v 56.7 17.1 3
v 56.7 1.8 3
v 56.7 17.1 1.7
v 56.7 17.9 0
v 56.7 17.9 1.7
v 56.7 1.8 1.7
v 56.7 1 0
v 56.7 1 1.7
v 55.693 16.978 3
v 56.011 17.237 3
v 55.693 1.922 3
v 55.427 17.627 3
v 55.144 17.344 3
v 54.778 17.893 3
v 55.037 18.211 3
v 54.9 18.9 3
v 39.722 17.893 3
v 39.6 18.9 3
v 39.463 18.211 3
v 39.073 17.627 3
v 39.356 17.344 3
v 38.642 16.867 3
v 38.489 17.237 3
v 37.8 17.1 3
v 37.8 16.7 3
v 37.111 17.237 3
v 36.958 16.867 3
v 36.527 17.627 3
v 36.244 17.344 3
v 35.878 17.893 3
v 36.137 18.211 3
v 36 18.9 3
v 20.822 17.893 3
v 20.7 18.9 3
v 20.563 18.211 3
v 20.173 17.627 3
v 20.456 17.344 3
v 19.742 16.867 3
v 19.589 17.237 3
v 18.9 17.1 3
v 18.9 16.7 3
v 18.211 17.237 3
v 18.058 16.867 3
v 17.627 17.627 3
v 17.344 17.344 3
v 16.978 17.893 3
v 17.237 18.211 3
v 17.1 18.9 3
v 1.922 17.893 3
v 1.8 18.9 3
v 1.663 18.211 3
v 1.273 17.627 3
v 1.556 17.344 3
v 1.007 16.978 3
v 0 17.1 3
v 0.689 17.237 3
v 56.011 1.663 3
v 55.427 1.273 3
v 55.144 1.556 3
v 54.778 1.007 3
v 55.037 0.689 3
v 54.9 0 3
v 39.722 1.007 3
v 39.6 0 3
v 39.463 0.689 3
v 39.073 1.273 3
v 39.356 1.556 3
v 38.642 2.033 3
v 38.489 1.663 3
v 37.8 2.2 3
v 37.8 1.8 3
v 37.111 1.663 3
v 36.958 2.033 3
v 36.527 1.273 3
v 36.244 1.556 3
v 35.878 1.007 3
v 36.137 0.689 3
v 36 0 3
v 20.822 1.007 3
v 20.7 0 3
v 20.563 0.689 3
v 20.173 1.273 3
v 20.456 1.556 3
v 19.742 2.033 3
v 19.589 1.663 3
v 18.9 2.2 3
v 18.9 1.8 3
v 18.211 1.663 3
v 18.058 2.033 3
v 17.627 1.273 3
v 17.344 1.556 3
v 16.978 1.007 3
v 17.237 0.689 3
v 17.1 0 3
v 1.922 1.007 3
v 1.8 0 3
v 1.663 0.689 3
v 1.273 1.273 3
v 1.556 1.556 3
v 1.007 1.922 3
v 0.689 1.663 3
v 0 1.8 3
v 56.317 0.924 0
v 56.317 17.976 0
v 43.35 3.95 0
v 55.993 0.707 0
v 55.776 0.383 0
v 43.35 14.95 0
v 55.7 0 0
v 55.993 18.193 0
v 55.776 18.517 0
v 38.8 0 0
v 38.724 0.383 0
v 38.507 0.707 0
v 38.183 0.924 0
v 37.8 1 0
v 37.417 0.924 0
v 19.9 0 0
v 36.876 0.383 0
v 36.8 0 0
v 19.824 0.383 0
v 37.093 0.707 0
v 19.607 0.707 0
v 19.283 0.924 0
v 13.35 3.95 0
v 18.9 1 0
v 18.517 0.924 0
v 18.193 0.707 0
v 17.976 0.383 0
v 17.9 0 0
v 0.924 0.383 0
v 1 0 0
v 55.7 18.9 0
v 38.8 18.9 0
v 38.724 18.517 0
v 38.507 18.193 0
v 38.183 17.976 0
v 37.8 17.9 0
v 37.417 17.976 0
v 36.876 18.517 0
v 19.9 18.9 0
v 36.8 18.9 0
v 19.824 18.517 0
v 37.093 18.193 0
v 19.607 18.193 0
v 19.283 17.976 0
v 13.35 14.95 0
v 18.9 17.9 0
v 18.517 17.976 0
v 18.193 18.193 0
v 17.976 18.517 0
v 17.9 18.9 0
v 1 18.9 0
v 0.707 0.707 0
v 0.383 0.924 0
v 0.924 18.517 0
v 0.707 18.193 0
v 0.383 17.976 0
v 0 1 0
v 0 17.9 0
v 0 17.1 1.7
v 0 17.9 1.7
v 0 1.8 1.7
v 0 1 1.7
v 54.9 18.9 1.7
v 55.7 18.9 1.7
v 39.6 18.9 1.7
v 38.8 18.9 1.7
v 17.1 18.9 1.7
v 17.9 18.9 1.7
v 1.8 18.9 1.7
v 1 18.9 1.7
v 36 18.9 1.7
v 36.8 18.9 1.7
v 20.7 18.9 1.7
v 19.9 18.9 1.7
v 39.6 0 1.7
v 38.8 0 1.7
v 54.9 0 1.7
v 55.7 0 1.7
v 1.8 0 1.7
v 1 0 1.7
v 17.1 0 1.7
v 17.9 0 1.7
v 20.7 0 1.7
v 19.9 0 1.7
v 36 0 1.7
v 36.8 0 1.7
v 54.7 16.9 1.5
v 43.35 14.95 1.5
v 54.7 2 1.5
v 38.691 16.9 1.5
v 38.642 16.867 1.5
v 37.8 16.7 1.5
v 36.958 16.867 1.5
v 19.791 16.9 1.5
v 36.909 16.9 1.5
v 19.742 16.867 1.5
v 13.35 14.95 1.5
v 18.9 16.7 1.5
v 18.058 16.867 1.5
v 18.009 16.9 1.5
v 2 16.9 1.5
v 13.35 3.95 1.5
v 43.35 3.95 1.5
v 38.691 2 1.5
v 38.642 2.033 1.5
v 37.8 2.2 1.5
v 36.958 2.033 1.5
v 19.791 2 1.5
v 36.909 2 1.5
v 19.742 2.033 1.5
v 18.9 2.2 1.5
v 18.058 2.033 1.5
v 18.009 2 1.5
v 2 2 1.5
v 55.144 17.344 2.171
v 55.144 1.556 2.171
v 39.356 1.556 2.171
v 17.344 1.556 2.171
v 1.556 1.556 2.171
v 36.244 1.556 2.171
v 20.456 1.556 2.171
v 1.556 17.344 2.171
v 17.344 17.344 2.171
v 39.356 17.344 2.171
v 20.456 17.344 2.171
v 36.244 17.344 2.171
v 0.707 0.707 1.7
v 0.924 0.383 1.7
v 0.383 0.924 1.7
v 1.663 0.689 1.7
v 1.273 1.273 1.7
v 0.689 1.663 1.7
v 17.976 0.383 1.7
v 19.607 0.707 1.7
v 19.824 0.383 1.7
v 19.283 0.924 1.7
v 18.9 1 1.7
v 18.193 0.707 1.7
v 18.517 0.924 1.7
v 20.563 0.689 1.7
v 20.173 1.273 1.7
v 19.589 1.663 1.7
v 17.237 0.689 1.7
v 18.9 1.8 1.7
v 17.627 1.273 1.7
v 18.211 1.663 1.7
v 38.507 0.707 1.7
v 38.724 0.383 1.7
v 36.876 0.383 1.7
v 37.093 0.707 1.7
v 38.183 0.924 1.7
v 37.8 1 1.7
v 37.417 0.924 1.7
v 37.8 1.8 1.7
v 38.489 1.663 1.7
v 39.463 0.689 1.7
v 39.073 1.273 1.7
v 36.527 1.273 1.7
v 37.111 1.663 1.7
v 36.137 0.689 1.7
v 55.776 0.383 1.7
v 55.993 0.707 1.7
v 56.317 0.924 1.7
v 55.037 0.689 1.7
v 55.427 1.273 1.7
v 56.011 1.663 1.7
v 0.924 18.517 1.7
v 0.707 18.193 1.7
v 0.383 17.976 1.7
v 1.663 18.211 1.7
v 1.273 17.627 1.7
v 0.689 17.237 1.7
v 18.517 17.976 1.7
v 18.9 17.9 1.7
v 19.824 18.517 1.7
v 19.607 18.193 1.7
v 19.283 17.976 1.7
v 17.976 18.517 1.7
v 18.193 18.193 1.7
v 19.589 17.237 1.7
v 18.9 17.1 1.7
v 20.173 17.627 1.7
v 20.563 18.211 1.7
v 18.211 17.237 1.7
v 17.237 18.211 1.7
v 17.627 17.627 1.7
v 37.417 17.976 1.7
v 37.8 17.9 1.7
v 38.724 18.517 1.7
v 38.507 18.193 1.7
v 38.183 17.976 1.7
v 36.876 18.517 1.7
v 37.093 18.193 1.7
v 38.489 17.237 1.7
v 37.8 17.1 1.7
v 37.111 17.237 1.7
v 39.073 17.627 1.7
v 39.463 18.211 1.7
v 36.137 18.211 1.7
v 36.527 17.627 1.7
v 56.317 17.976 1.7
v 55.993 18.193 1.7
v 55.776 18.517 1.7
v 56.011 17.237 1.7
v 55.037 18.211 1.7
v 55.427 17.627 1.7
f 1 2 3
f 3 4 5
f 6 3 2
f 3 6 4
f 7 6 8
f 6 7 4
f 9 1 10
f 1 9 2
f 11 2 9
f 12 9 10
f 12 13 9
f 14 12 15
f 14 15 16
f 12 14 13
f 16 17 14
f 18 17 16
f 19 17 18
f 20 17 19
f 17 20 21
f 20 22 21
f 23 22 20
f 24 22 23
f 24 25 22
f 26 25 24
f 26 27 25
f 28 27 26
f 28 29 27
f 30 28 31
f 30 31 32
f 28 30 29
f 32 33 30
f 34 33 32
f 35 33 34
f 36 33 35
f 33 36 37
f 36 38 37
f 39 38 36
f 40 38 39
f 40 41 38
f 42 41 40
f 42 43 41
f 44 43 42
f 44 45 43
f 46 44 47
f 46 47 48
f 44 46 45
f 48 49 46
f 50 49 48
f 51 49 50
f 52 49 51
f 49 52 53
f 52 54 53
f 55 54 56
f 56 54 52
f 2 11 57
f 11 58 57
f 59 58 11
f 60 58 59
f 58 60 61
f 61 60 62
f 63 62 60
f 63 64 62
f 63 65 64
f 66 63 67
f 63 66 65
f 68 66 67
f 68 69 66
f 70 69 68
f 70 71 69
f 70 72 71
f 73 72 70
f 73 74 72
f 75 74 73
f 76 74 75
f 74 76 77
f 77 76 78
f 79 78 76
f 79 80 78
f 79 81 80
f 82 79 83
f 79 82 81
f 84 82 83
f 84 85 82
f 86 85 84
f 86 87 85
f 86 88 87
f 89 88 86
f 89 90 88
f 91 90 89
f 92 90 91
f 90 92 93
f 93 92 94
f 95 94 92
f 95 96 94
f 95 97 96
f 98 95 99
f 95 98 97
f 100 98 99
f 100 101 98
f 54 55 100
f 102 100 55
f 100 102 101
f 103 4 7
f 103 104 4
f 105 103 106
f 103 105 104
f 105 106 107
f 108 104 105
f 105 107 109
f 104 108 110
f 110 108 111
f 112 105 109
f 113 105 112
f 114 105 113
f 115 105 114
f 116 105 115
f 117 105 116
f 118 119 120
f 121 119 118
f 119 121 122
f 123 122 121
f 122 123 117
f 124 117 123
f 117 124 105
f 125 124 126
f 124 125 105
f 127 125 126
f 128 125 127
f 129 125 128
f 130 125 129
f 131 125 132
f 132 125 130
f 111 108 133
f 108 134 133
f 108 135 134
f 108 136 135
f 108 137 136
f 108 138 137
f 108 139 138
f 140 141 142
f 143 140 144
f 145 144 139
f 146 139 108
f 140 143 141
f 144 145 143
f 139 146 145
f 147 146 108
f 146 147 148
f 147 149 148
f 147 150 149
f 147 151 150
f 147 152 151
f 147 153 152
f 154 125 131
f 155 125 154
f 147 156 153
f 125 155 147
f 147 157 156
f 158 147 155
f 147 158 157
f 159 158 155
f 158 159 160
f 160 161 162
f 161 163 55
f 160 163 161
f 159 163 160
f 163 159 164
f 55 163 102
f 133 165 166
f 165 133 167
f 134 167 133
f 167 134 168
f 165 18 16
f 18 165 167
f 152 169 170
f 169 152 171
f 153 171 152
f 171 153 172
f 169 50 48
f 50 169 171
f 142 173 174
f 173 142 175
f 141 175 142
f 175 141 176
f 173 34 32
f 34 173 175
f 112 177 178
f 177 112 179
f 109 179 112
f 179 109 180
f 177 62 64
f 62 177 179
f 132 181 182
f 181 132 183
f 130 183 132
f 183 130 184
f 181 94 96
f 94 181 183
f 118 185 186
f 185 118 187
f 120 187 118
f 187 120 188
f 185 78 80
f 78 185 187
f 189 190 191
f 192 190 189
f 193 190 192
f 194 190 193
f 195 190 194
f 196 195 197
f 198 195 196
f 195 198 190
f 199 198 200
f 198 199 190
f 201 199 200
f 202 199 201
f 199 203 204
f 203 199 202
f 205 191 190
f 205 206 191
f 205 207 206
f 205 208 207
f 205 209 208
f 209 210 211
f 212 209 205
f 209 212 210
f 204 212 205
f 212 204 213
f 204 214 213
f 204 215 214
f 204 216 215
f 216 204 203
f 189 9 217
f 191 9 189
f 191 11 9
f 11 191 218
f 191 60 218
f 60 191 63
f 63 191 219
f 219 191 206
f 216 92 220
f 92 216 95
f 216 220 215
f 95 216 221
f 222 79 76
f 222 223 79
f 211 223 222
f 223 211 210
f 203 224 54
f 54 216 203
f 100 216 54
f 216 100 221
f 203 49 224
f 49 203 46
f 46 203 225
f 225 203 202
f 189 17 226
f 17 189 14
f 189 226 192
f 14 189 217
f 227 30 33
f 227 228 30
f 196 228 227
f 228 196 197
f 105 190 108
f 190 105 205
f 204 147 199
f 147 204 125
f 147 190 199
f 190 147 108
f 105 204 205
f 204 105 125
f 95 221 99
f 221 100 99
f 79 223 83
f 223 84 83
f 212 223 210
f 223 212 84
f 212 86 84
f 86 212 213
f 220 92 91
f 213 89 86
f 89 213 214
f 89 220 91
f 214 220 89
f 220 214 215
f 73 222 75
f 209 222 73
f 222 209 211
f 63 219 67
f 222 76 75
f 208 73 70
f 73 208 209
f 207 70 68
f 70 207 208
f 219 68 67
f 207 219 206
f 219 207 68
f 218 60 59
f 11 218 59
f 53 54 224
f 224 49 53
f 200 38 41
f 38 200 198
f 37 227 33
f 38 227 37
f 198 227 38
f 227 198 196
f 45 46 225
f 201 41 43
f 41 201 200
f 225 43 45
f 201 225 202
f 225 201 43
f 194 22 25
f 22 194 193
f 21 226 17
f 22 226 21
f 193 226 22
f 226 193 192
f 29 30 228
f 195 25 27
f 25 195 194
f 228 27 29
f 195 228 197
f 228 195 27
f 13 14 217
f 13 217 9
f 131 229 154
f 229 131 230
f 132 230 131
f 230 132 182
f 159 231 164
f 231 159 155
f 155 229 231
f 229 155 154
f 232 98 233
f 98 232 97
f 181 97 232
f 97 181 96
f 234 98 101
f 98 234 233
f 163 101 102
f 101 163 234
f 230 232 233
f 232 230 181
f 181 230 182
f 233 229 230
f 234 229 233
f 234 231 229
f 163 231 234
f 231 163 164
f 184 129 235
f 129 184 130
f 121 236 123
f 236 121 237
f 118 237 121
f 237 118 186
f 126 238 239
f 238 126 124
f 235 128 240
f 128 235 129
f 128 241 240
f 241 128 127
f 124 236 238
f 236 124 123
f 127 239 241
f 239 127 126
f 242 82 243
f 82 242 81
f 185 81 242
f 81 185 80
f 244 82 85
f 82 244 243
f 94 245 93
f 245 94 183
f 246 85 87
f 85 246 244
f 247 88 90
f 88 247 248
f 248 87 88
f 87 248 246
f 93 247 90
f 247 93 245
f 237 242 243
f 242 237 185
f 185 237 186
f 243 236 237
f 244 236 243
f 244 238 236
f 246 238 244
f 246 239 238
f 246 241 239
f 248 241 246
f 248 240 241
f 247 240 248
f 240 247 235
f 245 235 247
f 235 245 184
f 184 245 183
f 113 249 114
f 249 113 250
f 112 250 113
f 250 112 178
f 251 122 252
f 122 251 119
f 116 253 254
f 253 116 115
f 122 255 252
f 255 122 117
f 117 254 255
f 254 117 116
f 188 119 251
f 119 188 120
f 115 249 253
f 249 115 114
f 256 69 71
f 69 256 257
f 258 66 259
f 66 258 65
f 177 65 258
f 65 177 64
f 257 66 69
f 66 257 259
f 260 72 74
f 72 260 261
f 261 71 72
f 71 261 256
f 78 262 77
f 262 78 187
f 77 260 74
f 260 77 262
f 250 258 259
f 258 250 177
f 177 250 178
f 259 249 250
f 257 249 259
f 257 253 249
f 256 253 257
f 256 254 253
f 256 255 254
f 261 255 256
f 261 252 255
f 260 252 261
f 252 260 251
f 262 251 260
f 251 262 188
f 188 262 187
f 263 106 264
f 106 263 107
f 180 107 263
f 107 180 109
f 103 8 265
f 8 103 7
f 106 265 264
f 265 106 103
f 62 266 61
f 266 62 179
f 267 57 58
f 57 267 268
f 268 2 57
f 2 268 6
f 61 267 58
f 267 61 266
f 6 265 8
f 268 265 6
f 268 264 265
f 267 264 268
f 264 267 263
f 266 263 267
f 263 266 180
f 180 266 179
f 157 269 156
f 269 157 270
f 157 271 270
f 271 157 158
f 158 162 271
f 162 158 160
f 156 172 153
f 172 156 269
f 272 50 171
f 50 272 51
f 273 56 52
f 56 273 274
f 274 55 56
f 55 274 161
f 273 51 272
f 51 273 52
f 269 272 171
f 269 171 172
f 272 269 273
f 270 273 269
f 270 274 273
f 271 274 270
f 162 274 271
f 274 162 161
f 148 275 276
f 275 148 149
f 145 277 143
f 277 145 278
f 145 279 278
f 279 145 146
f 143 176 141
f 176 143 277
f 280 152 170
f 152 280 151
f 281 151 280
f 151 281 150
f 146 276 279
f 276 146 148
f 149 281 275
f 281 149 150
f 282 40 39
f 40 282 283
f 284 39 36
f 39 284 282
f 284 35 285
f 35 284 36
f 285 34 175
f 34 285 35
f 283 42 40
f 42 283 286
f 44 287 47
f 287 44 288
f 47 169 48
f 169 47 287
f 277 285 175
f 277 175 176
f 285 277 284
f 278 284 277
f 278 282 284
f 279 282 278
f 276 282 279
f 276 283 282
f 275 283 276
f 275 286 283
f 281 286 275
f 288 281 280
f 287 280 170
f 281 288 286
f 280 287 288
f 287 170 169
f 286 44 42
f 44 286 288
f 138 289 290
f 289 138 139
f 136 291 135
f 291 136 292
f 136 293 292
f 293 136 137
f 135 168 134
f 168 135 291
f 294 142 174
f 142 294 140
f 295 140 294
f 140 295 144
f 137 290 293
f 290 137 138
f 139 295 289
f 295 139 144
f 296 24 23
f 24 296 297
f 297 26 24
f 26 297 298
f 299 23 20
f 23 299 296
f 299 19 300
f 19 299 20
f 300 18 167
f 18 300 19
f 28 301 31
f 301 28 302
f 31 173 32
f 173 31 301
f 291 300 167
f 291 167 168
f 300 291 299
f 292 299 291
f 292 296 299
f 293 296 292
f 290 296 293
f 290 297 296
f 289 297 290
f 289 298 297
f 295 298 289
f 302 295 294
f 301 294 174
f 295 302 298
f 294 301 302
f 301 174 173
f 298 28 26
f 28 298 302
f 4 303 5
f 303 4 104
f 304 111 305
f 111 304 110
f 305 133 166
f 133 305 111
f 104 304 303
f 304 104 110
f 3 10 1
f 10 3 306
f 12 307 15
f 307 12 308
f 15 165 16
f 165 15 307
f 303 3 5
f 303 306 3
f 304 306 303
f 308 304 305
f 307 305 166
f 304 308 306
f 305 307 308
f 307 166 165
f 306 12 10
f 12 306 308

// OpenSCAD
//OpenSCAD-Skript

//Moduldefinition mit Parametern für Frontplattensystem im 19mm-Raster
module FrontElem (
//Frontplattenelement
xwert=3,        //Anzahl der Segmente in horizontaler Richtung
ywert=1,        //Anzahl der Segmente in vertikaler Richtung
segment=18.9,   //Kantenlänge des Segments
hght=3.0,       //Höhe des Rands des Frontplattensegments
thick=1.5,      //verbleibende Dicke des Frontplattensegments
wo=1.0,         //Wandstärke oben
wu=2.0,         //Wandstärke unten
//M3-Schrauben
M3=false,       //Bohrungen für M3-Zylinderkopf-Inbusschraube
skd3=5.6,       //Schraubenkopfdurchmesser M3-Schraube
skh3=3.3,       //Schraubenkopfhöhe M3-Schraube
dsh3=3.1,       //Schaftdurchmesser M3-Schraube
dvst3=7,        //Verstärkung für M3-Schraube
//Schneidschrauben 2mmx6mm
B2mm=true,      //Bohrungen für 2mm-Schneidschrauben
skd2=3.6,       //Schraubenkopfdurchmesser 2mm-Schraube (4.4)
skh2=1.3,       //Schraubenkopfhöhe 2mm-Schraube
dsh2=2.0,       //Schaftdurchmesser 2mm-Schraube
dvst2=4.4,      //Verstärkung für 2mm-Schraube
//Beschriftungsfeld eingesenkt
Btext=6.0,      //Breite Beschriftungsband
Ltext=12,       //Länge Beschriftungsband
Dtext=0.3,      //Tiefe Beschriftungsfeld, oder Null
//LED 3mm
LEDdia=3.0,     //Durchmesser LED
//Quadrat-LED
LEDr=5.0,       //Kantenlänge quadratische LED
//Rechteck-LED
LEDB=5.0,       //Breite der Rechteck-LED
LEDH=3.0,       //Höhe der Rechteck-LED
//Hebel-Kippschalter
KSWdia=6.0,     //Schaftdurchmesser Kippschalter
//Drehschalter
RSWdia=9.2,     //Schaftdurchmesser Drehschalter
RSWdist=9.4,    //Mittenabstand Pin
RSWpin=3.0,     //Durchmesser Pin
//Bohrung für Potischaft 6mm
POTdia=6.8,     //Schaftdurchmesser Poti
//Polklemme M4
TRMdia=4.0,     //Bohrung für Polklemme M4
TRSdia=6.0,     //Bohrung für Telefonbuchse 4mm
//MC-Einbaubuchse
MCdia=11.8,     //Bohrung für MC-Buchse 4mm
MCdist=10.4,    //Abstand Abflachungen
//BNC-Einbaubuchse
BNCdia=9.5,     //Durchmesser Bohrung
BNCdist=8.0,    //Abstand Abflachung
//Panelmeter 3-stellig
PM3B=22.5,      //Breite Panelmeter 3-stellig
PM3H=14.5,      //Höhe Panelmeter 3-stellig
//Panelmeter 4-stellig
PM4B=30.0,      //Breite Panelmeter 4-stellig
PM4H=14.2,      //Höhe Panelmeter 4-stellig
//Kaltgerätestecker
KGSW=27.3,      //Länge Ausschnitt in x-Richtung Kaltgerätestecker
KGSH=20,        //Höhe Ausschnitt in y-Richtung Kaltgerätestecker
KGSR=9          //Rundungsdurchmesser Ausschnitt Kaltgerätestecker

)
//Beginn Modul
{
difference(){   //difference 1
union(){        //union 1
difference(){   //difference 2
union(){        //union 2
    //alles, was vor der nächsten geschweiften Klammer steht, wird zusammengefügt (union 2)
//Körper des Frontplattensegments
cube([xwert*segment, ywert*segment, hght]);


}               //union 2 end
    //alles, was vor der nächsten geschweiften Klammer steht, wird davon abgezogen (difference 2)
//Einsenkung in das Segment
polyhedron(
               points= [[wu,wu,thick],                                  //0 unten
                        [xwert*segment-wu,wu,thick],                    //1 unten
                        [xwert*segment-wu,ywert*segment-wu,thick],      //2 unten
                        [wu,ywert*segment-wu,thick],                    //3 unten
                        [wo,wo,hght+0.01],                              //4 oben
                        [wo,ywert*segment-wo, hght+0.01],               //5 oben
                        [xwert*segment-wo,ywert*segment-wo,hght+0.01],  //6 oben
                        [xwert*segment-wo,wo,hght+0.01],                //7 oben
                       ],
               faces=  [[0,1,2,3],      //Boden
                        [0,4,7,1],      //Deckel
                        [1,7,6,2],      //Front
                        [2,6,5,3],      //Seitenwand rechts
                        [3,5,4,0],      //Rückwand
                        [4,5,6,7]]      //Seitenwand links
               );   


//Ausschnitt Schalter
translate([xwert*segment/2-30/2,ywert*segment/2-5.5,-0.1]) cube([30,11,20]);


/*
//Ausschnitt Kaltgerätestecker
translate([0,7,0]) {
//Mittenausschnitt
translate([xwert*segment/2-22/2,ywert*segment/2-14,-0.1]) cube([22,14,20]);
//Rundungen
translate([xwert*segment/2-22/2,ywert*segment/2-14,-0.1])cylinder(d=8,h=20,$fn=32);
translate([xwert*segment/2-22/2,ywert*segment/2,-0.1])cylinder(d=8,h=20,$fn=32);
translate([xwert*segment/2+22/2,ywert*segment/2-14,-0.1])cylinder(d=8,h=20,$fn=32);
translate([xwert*segment/2+22/2,ywert*segment/2,-0.1])cylinder(d=8,h=20,$fn=32);
//Seitensegmente
translate([xwert*segment/2-22/2,ywert*segment/2-0.1,-0.1]) cube([22,4+0.1,20]);
translate([xwert*segment/2-22/2,ywert*segment/2-14-4,-0.1]) cube([22,4+0.1,20]);
translate([xwert*segment/2-22/2-4,ywert*segment/2-14,-0.1]) cube([4+0.1,14,20]);
translate([xwert*segment/2+22/2-0.1,ywert*segment/2-14,-0.1]) cube([4+0.1,14,20]);
//Schraubenlöcher
translate([xwert*segment/2-36/2,ywert*segment/2-14/2,-0.1])cylinder(d=4,h=20,$fn=32);
translate([xwert*segment/2+36/2,ywert*segment/2-14/2,-0.1])cylinder(d=4,h=20,$fn=32);
*/

/*
//Bohrung für LED mittig (Mindestgröße 1x1)
translate([xwert*segment/2,ywert*segment/2-3,-0.1])  cylinder(d=LEDdia, h=10, $fn=32);
*/

/*
//Bohrung für 2x 3mm-LED nach unten versetzt mit Textfeld darüber (Mindestgröße 1x1, bei 10mm LED 1x2)
translate([xwert*segment/2-3,ywert*segment/2-3,-0.1])  cylinder(d=LEDdia, h=10, $fn=32);
translate([xwert*segment/2+3,ywert*segment/2-3,-0.1])  cylinder(d=LEDdia, h=10, $fn=32);
translate([xwert*segment/2-Ltext/2,ywert*segment/2,thick-Dtext+0.05])  cube([Ltext, Btext, Dtext]); 
*/

/*
//Bohrung für Kippschalter mittig (Mindestgröße 1x1)
translate([xwert*segment/2,ywert*segment/2,-0.1])  cylinder(d=KSWdia, h=10, $fn=32); 
*/

/*
//Bohrungen für Drehschalter mit Pin (Mindestgröße 2x2)
translate([xwert*segment/2,ywert*segment/2,-0.1])  cylinder(d=RSWdia, h=10, $fn=32);
translate([xwert*segment/2+RSWdist,ywert*segment/2,-0.1])  cylinder(d=RSWpin, h=1.5, $fn=32);
*/

/*
//Bohrung für Potentiometer 3mm-Schaft (Mindestgröße 1x1)
translate([xwert*segment/2,ywert*segment/2,-0.1])  cylinder(d=POTdia, h=10, $fn=32);
*/

/*
//Bohrung für 2x 4mm-Polklemme M4 (Mindestgröße 1x1)
translate([xwert*segment/2-10,ywert*segment/2,-0.1])  cylinder(d=TRMdia, h=10, $fn=32);
translate([xwert*segment/2+10,ywert*segment/2,-0.1])  cylinder(d=TRMdia, h=10, $fn=32);
*/
/*
//Bohrung für 4mm-Telefonbuchse (Mindestgröße 1x1)
translate([xwert*segment/2,ywert*segment/2,-0.1])  cylinder(d=TRSdia, h=10, $fn=32);
*/

/*
//Bohrung für 4mm-MC-Buchse (Mindestgröße 2x2), siehe auch union1 für Abflachungen
translate([xwert*segment/2,ywert*segment/2,-0.1])  cylinder(d=MCdia, h=10, $fn=32);
*/

/*
//Bohrung für BNC-Buchse (Mindestgröße 1x1), siehe auch union1 für Abflachungen
translate([xwert*segment/2,ywert*segment/2,-0.1])  cylinder(d=BNCdia, h=10, $fn=32);
*/

/*
//Ausschnitt Panelmeter 3-stellig (Mindestgröße 2x1)
translate([xwert*segment/2-PM3B/2,ywert*segment/2-PM3H/2,-0.1])  cube([PM3B, PM3H, 10]);
*/

/*
//Ausschnitt Panelmeter 4-stellig (Mindestgröße 2x1)
translate([xwert*segment/2-PM4B/2,ywert*segment/2-PM4H/2,-0.1])  cube([PM4B, PM4H, 10]);
*/       
        
}  //difference 2 end
    //alles, was vor der nächsten geschweiften Klammer steht, wird dazu hinzugefügt (union 1)
//Verstärkungen für Schrauben x-Achse unten
for (x=[0:segment:xwert*segment])
{
if (M3==true) translate([x,0,0]) cylinder(d=dvst3,h=hght,$fn=16);
if (B2mm==true) translate([x,0,0]) cylinder(d=dvst2,h=hght,$fn=16);
}
//Verstärkungen für Schrauben x-Achse oben
for (x=[0:segment:xwert*segment])
{
if (M3==true) translate([x,ywert*segment,0]) cylinder(d=dvst3,h=hght,$fn=16);
if (B2mm==true) translate([x,ywert*segment,0]) cylinder(d=dvst2,h=hght,$fn=16);
}
//Verstärkungen für Schrauben y-Achse links
for (y=[0:segment:ywert*segment])
{
if (M3==true) translate([0,y,0]) cylinder(d=dvst3,h=hght,$fn=16);
if (B2mm==true) translate([0,y,0]) cylinder(d=dvst2,h=hght,$fn=16);
}
//Verstärkungen für Schrauben y-Achse rechts
for (y=[0:segment:ywert*segment])
{
if (M3==true) translate([xwert*segment,y,0]) cylinder(d=dvst3,h=hght,$fn=16);
if (B2mm==true) translate([xwert*segment,y,0]) cylinder(d=dvst2,h=hght,$fn=16);
}

/*
//Abflachungen für 4mm-MC-Buchse (Mindestgröße 2x2)
translate([xwert*segment/2-5,ywert*segment/2+MCdist/2,0])  cube([10,3,thick]);
translate([xwert*segment/2-5,ywert*segment/2-MCdist/2-3,0])  cube([10,3,thick]);
*/

/*
//Abflachungen für BNC-Buchse (Mindestgröße 1x1)
translate([xwert*segment/2-5,ywert*segment/2+BNCdist/2,0])  cube([10,3,thick]);
translate([xwert*segment/2-5,ywert*segment/2-BNCdist/2-3,0])  cube([10,3,thick]);
*/

}               //union 1 end
    //alles, was vor der nächsten geschweiften Klammer steht, wird davon wieder abgezogen (difference 1)
//Bohrungen für Schrauben x-Achse unten
for (x=[0:segment:xwert*segment])
{
if (M3==true) translate([x,0,-0.1]) cylinder(d=dsh3,h=2*hght,$fn=16);
if (M3==true) translate([x,0,hght-skh3]) cylinder(d=skd3,h=2*hght,$fn=16);
if (B2mm==true) translate([x,0,-0.1]) cylinder(d=dsh2,h=2*hght,$fn=16);
if (B2mm==true) translate([x,0,hght-skh2]) cylinder(d=skd2,h=2*hght,$fn=16); 
}
//Bohrungen für Schrauben x-Achse oben
for (x=[0:segment:xwert*segment])
{
if (M3==true) translate([x,ywert*segment,-0.1]) cylinder(d=dsh3,h=2*hght,$fn=16);
if (M3==true) translate([x,ywert*segment,hght-skh3]) cylinder(d=skd3,h=2*hght,$fn=16);
if (B2mm==true) translate([x,ywert*segment,-0.1]) cylinder(d=dsh2,h=2*hght,$fn=16);
if (B2mm==true) translate([x,ywert*segment,hght-skh2]) cylinder(d=skd2,h=2*hght,$fn=16); 
}
//Bohrungen für Schrauben y-Achse links
for (y=[0:segment:ywert*segment])
{
if (M3==true) translate([0,y,-0.1]) cylinder(d=dsh3,h=2*hght,$fn=16);
if (M3==true) translate([0,y,hght-skh3]) cylinder(d=skd3,h=2*hght,$fn=16);
if (B2mm==true) translate([0,y,-0.1]) cylinder(d=dsh2,h=2*hght,$fn=16);
if (B2mm==true) translate([0,y,hght-skh2]) cylinder(d=skd2,h=2*hght,$fn=16); 
}
//Bohrungen für Schrauben y-Achse rechts
for (y=[0:segment:ywert*segment])
{
if (M3==true) translate([xwert*segment,y,-0.1]) cylinder(d=dsh3,h=2*hght,$fn=16);
if (M3==true) translate([xwert*segment,y,hght-skh3]) cylinder(d=skd3,h=2*hght,$fn=16);
if (B2mm==true) translate([xwert*segment,y,-0.1]) cylinder(d=dsh2,h=2*hght,$fn=16);
if (B2mm==true) translate([xwert*segment,y,hght-skh2]) cylinder(d=skd2,h=2*hght,$fn=16); 
}
//Abschneiden Verstärkungen unten
translate([-250,-10,-0.1])
cube([500,10,25]);
//Abschneiden Verstärkungen oben
translate([-250,ywert*segment,-0.1])
cube([500,10,25]);
//Abschneiden Verstärkungen links
translate([-10,-250,-0.1])
cube([10,500,25]);
//Abschneiden Verstärkungen rechts
translate([xwert*segment,-250,-0.1])
cube([10,500,25]);
}               //difference 1 end

}  //module end

//Hier werden Instanzen des Moduls aufgerufen
translate([0,0,0]) FrontElem();
